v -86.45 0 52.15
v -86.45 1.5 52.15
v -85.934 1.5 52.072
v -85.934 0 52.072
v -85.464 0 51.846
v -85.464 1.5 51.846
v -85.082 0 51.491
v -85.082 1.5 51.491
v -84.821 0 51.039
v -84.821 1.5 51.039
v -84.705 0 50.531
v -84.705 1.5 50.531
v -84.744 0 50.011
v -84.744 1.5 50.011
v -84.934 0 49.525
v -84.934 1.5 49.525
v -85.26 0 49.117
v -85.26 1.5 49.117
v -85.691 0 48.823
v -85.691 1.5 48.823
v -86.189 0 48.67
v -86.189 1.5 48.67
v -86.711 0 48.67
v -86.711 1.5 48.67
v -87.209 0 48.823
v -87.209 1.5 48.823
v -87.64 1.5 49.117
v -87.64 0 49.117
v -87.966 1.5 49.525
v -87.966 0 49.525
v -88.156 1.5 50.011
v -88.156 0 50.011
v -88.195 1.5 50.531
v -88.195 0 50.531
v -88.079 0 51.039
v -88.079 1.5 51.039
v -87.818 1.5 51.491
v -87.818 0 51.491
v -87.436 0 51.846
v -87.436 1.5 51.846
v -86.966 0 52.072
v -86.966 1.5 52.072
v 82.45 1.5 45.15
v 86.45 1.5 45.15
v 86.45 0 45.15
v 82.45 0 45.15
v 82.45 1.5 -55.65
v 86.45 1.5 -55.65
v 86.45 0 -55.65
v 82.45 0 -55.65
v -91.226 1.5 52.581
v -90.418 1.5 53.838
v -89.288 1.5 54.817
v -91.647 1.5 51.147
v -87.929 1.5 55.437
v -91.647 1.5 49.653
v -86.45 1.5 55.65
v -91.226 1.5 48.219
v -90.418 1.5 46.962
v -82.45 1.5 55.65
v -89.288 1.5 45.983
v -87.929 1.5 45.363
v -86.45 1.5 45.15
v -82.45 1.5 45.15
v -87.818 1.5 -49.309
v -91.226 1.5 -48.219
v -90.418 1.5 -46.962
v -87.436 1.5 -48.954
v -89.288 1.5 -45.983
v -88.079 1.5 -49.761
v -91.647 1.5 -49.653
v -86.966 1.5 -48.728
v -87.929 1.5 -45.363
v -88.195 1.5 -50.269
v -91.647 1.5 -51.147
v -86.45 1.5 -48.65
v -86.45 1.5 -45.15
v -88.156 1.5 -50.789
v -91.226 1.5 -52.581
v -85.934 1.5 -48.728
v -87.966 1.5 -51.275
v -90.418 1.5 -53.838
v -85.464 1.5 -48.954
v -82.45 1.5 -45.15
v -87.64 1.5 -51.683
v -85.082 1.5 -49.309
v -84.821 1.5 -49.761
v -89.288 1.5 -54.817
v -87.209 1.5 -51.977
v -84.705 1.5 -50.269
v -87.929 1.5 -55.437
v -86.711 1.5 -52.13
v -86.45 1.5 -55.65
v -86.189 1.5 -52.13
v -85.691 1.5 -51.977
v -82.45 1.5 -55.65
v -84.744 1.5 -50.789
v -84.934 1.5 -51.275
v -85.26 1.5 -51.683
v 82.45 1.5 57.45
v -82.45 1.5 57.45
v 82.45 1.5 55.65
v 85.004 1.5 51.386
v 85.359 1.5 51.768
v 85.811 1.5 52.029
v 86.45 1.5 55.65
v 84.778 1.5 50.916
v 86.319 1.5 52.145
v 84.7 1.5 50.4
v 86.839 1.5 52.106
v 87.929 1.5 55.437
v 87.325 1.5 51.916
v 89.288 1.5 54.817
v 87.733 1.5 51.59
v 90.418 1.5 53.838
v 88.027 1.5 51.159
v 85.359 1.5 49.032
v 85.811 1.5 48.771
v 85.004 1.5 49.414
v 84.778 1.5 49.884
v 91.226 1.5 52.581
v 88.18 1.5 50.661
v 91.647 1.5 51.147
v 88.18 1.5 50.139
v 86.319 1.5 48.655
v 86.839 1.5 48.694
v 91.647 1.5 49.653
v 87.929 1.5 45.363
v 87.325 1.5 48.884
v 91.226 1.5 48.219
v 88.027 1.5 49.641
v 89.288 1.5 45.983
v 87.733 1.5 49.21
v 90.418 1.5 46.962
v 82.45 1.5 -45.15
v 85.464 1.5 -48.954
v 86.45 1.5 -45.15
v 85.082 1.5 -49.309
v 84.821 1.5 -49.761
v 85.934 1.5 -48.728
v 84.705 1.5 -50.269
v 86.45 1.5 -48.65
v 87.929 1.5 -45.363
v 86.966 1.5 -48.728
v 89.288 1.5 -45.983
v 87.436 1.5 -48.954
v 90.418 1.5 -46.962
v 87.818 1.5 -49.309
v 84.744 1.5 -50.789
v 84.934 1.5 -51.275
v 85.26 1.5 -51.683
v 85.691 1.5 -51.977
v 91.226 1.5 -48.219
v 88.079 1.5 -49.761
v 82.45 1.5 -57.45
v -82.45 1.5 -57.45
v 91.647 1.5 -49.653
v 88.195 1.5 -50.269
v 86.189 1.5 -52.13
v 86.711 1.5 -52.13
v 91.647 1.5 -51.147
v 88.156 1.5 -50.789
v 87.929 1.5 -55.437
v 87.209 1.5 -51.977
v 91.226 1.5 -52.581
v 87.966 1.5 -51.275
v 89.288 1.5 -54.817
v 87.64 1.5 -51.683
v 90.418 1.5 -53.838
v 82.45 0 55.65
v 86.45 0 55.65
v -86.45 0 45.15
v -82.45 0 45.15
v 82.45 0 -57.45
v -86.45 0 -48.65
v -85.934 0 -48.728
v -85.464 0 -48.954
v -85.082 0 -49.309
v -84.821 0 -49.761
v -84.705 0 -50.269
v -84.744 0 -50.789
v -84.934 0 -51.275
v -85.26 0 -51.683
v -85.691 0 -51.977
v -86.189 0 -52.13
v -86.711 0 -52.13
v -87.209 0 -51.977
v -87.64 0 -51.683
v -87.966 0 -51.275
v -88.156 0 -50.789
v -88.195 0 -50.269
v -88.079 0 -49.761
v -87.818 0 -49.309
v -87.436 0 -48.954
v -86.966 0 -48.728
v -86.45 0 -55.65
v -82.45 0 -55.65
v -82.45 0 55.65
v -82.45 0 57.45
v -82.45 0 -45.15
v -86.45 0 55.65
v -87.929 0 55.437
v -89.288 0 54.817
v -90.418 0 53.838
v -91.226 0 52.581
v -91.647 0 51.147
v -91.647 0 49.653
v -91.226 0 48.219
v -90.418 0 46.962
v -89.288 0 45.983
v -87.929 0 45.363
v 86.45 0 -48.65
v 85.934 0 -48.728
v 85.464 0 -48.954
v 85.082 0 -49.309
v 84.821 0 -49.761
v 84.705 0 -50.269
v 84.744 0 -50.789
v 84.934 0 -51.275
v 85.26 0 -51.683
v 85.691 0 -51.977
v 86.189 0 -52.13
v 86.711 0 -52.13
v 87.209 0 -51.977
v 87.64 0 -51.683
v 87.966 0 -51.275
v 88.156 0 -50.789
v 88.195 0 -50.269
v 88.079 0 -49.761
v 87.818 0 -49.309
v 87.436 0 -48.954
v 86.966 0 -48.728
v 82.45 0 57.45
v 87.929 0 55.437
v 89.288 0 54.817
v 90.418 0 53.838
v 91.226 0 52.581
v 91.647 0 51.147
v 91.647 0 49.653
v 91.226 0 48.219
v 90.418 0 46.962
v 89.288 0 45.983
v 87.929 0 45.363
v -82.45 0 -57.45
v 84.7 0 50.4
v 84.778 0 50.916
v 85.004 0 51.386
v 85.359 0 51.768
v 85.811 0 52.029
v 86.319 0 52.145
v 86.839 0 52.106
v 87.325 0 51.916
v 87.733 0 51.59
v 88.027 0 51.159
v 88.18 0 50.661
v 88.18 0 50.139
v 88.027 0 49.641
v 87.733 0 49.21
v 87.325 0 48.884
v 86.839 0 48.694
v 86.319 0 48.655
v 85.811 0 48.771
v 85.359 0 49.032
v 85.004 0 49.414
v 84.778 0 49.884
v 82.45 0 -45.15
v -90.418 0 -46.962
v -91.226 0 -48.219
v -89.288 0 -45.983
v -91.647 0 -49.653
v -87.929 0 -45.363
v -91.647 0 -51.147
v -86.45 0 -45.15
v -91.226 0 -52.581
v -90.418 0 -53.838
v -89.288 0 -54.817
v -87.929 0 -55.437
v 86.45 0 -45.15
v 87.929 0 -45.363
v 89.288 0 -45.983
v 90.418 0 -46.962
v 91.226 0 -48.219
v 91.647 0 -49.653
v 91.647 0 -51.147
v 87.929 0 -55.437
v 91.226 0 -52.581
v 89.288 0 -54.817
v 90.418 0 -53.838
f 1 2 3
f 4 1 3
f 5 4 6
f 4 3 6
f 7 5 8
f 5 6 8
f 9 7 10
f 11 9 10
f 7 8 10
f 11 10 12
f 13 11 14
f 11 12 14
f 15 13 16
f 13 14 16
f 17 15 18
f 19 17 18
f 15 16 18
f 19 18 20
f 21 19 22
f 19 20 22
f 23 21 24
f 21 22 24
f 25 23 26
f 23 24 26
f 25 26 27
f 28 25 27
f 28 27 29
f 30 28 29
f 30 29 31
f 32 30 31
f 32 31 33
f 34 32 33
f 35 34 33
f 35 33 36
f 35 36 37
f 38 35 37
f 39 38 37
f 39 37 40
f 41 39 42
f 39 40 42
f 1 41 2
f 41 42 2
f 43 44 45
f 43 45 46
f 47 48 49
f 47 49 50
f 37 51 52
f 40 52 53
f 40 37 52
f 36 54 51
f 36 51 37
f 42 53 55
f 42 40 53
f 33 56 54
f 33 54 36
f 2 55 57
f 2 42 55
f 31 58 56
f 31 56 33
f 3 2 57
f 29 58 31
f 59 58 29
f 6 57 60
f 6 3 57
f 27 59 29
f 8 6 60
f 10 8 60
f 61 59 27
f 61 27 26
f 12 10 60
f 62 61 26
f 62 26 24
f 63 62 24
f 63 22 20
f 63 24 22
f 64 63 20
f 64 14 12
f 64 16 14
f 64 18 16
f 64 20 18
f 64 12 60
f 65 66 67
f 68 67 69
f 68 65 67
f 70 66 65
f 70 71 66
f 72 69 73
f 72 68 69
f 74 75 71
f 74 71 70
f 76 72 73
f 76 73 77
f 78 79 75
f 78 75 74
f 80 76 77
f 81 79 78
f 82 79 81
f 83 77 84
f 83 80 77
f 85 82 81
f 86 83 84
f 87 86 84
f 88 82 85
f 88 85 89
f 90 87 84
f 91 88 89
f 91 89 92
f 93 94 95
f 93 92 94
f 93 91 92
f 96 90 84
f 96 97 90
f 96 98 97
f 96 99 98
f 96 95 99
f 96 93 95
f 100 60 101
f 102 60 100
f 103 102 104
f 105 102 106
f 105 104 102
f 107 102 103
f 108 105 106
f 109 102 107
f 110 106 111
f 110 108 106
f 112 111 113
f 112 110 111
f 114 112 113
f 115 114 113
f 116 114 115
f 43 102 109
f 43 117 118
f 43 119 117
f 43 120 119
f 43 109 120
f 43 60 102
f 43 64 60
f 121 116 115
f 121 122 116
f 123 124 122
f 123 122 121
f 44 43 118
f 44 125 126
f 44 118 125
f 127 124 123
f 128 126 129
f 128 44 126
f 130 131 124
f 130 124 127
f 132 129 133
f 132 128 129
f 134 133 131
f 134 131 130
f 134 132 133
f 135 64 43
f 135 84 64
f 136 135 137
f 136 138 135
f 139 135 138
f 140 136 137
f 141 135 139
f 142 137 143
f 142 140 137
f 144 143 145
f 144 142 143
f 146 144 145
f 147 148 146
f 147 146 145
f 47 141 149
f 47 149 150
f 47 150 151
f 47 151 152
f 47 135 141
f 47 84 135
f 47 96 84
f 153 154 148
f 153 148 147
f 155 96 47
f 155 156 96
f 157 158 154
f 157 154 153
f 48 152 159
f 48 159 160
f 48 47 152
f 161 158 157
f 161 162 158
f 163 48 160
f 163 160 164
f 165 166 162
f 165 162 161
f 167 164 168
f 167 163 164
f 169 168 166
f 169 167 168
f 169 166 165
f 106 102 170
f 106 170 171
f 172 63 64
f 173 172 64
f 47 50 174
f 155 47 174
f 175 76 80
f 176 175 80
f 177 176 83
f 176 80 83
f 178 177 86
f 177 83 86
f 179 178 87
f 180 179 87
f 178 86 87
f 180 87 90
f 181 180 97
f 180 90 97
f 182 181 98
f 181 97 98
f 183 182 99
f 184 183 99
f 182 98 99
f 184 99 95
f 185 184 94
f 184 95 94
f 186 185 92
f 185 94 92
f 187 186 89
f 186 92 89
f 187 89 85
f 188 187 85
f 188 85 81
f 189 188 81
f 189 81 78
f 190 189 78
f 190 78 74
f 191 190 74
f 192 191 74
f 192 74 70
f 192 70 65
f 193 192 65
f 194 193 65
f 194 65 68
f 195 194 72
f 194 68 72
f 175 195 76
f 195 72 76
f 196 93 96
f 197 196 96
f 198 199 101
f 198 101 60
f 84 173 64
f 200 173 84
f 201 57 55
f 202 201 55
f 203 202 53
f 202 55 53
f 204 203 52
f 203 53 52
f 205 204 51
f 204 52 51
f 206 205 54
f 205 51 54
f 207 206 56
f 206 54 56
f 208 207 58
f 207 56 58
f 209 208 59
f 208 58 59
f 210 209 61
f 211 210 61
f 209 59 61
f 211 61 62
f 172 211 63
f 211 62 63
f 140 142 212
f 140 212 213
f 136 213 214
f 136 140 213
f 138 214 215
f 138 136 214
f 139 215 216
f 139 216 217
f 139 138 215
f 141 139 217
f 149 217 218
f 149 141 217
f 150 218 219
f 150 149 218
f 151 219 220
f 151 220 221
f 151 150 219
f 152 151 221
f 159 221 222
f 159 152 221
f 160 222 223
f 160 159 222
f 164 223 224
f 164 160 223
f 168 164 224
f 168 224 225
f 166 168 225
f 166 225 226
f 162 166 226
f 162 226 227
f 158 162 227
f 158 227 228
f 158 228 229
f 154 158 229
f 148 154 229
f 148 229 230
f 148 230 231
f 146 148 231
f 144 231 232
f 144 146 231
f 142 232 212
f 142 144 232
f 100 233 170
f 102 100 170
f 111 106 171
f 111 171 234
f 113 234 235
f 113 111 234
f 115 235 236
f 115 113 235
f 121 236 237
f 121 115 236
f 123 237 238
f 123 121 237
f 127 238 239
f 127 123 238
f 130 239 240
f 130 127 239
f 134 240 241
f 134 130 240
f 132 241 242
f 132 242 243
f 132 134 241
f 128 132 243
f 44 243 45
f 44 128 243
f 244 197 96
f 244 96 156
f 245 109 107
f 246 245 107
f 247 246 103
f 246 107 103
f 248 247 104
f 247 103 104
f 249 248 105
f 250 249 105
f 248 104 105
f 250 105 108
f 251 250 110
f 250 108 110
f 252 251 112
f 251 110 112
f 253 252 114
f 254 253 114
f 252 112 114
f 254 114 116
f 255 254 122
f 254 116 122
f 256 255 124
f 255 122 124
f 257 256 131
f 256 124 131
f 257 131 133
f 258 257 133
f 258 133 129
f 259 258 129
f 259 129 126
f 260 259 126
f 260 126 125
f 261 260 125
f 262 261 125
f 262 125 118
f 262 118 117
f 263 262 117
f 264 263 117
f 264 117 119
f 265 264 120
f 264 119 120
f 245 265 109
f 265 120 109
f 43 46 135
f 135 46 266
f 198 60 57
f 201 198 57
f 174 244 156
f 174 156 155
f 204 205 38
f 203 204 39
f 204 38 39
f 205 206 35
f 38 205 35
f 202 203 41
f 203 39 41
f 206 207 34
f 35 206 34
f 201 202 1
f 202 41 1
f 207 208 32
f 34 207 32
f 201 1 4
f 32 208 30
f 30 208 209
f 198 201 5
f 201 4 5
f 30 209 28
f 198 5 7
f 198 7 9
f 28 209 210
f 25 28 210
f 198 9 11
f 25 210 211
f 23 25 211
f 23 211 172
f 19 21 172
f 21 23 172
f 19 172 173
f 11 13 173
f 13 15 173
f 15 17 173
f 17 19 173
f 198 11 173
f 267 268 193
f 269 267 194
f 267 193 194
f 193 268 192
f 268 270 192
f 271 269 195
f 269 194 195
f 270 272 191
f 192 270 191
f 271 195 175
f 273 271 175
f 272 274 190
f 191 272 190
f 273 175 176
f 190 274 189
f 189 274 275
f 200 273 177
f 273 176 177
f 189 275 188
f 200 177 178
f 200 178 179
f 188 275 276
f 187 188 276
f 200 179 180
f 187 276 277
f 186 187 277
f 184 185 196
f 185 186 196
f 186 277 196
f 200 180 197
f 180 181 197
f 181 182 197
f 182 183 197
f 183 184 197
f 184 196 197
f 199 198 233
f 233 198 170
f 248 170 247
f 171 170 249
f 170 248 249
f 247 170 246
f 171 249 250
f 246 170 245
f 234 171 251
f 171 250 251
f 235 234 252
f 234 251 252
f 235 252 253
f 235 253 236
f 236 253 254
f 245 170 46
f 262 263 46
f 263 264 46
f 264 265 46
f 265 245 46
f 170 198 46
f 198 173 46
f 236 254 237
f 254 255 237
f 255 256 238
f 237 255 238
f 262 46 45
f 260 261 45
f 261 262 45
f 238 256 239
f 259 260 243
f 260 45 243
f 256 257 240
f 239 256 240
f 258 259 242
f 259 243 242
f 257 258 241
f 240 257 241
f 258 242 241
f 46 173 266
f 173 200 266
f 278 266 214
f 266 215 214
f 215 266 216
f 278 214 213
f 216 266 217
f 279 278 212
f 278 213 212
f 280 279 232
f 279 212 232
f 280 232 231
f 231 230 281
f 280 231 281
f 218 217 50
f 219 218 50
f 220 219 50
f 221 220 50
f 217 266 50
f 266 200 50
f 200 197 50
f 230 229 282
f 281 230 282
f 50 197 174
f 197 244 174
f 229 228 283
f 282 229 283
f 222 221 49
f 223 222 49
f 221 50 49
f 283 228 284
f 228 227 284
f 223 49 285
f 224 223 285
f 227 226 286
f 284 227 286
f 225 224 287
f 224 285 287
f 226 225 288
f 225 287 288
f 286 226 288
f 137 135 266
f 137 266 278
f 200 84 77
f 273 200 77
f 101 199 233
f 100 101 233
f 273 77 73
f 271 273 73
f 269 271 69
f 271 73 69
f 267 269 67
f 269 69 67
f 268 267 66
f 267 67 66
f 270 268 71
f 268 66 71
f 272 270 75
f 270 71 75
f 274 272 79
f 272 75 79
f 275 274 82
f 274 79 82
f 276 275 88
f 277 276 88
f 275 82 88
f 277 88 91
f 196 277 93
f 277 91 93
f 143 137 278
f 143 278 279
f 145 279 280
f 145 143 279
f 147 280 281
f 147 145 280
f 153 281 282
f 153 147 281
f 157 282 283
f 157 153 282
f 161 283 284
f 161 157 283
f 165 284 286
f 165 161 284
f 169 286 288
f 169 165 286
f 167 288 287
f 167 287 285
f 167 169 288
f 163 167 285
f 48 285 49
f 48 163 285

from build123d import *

# Parameters (mm, degrees)
SKETCH1_W               = 164.9
SKETCH1_H               = 114.9
BOSS_EXTRUDE1_DEPTH     = 1.5
SKETCH2_R               = 1.75
BOSS_EXTRUDE2_DEPTH     = 1.5
LPATTERN1_COUNT         = 2
LPATTERN1_PITCH         = 100.8
MIRROR1_COPY_1_SKETCH_R = 1.75
MIRROR1_COPY_1_DEPTH    = 1.5


with BuildPart() as part:
    # Sketch1 → Boss-Extrude1 (new body)
    with BuildSketch(Plane(origin=(0, 0, 0), x_dir=(1, 0, 0), z_dir=(0, 1, 0))):
        Rectangle(SKETCH1_W, SKETCH1_H)
    extrude(amount=BOSS_EXTRUDE1_DEPTH)

    # Sketch2 → Boss-Extrude2 (add)
    with BuildSketch(Plane(origin=(0, 1.5, 0), x_dir=(1, 0, 0), z_dir=(0, 1, 0))):
        with BuildLine():
            Line((-82.45, 55.65), (-82.45, 45.15))
            Line((-82.45, 45.15), (-86.45, 45.15))
            ThreePointArc((-86.45, 45.15), (-91.7, 50.4), (-86.45, 55.65))
            Line((-86.45, 55.65), (-82.45, 55.65))
        make_face()
        with Locations(Location((-86.45, 50.4, 0), (0, 0, 270))):
            Circle(SKETCH2_R, mode=Mode.SUBTRACT)
    boss_extrude2 = extrude(amount=-BOSS_EXTRUDE2_DEPTH)

    # LPattern1: Boss-Extrude2 ×2
    with Locations(*[(0, 0, i * LPATTERN1_PITCH) for i in range(1, LPATTERN1_COUNT)]):
        add(boss_extrude2)

    # Mirror1: Boss-Extrude2 across plane
    add(boss_extrude2.mirror(Plane(origin=(0, 0, 0), x_dir=(0, 0, 1), z_dir=(1, 0, 0))))

    # Mirror1 copy 1 sketch → Mirror1 copy 1 (add)
    with BuildSketch(Plane(origin=(0, 1.5, 100.8), x_dir=(-1, 0, 0), z_dir=(0, 1, 0))):
        with BuildLine():
            Line((-82.45, -55.65), (-82.45, -45.15))
            Line((-82.45, -45.15), (-86.45, -45.15))
            ThreePointArc((-86.45, -45.15), (-91.7, -50.4), (-86.45, -55.65))
            Line((-86.45, -55.65), (-82.45, -55.65))
        make_face()
        with Locations((-86.45, -50.4)):
            Circle(MIRROR1_COPY_1_SKETCH_R, mode=Mode.SUBTRACT)
    extrude(amount=-MIRROR1_COPY_1_DEPTH)


solid = part.part
